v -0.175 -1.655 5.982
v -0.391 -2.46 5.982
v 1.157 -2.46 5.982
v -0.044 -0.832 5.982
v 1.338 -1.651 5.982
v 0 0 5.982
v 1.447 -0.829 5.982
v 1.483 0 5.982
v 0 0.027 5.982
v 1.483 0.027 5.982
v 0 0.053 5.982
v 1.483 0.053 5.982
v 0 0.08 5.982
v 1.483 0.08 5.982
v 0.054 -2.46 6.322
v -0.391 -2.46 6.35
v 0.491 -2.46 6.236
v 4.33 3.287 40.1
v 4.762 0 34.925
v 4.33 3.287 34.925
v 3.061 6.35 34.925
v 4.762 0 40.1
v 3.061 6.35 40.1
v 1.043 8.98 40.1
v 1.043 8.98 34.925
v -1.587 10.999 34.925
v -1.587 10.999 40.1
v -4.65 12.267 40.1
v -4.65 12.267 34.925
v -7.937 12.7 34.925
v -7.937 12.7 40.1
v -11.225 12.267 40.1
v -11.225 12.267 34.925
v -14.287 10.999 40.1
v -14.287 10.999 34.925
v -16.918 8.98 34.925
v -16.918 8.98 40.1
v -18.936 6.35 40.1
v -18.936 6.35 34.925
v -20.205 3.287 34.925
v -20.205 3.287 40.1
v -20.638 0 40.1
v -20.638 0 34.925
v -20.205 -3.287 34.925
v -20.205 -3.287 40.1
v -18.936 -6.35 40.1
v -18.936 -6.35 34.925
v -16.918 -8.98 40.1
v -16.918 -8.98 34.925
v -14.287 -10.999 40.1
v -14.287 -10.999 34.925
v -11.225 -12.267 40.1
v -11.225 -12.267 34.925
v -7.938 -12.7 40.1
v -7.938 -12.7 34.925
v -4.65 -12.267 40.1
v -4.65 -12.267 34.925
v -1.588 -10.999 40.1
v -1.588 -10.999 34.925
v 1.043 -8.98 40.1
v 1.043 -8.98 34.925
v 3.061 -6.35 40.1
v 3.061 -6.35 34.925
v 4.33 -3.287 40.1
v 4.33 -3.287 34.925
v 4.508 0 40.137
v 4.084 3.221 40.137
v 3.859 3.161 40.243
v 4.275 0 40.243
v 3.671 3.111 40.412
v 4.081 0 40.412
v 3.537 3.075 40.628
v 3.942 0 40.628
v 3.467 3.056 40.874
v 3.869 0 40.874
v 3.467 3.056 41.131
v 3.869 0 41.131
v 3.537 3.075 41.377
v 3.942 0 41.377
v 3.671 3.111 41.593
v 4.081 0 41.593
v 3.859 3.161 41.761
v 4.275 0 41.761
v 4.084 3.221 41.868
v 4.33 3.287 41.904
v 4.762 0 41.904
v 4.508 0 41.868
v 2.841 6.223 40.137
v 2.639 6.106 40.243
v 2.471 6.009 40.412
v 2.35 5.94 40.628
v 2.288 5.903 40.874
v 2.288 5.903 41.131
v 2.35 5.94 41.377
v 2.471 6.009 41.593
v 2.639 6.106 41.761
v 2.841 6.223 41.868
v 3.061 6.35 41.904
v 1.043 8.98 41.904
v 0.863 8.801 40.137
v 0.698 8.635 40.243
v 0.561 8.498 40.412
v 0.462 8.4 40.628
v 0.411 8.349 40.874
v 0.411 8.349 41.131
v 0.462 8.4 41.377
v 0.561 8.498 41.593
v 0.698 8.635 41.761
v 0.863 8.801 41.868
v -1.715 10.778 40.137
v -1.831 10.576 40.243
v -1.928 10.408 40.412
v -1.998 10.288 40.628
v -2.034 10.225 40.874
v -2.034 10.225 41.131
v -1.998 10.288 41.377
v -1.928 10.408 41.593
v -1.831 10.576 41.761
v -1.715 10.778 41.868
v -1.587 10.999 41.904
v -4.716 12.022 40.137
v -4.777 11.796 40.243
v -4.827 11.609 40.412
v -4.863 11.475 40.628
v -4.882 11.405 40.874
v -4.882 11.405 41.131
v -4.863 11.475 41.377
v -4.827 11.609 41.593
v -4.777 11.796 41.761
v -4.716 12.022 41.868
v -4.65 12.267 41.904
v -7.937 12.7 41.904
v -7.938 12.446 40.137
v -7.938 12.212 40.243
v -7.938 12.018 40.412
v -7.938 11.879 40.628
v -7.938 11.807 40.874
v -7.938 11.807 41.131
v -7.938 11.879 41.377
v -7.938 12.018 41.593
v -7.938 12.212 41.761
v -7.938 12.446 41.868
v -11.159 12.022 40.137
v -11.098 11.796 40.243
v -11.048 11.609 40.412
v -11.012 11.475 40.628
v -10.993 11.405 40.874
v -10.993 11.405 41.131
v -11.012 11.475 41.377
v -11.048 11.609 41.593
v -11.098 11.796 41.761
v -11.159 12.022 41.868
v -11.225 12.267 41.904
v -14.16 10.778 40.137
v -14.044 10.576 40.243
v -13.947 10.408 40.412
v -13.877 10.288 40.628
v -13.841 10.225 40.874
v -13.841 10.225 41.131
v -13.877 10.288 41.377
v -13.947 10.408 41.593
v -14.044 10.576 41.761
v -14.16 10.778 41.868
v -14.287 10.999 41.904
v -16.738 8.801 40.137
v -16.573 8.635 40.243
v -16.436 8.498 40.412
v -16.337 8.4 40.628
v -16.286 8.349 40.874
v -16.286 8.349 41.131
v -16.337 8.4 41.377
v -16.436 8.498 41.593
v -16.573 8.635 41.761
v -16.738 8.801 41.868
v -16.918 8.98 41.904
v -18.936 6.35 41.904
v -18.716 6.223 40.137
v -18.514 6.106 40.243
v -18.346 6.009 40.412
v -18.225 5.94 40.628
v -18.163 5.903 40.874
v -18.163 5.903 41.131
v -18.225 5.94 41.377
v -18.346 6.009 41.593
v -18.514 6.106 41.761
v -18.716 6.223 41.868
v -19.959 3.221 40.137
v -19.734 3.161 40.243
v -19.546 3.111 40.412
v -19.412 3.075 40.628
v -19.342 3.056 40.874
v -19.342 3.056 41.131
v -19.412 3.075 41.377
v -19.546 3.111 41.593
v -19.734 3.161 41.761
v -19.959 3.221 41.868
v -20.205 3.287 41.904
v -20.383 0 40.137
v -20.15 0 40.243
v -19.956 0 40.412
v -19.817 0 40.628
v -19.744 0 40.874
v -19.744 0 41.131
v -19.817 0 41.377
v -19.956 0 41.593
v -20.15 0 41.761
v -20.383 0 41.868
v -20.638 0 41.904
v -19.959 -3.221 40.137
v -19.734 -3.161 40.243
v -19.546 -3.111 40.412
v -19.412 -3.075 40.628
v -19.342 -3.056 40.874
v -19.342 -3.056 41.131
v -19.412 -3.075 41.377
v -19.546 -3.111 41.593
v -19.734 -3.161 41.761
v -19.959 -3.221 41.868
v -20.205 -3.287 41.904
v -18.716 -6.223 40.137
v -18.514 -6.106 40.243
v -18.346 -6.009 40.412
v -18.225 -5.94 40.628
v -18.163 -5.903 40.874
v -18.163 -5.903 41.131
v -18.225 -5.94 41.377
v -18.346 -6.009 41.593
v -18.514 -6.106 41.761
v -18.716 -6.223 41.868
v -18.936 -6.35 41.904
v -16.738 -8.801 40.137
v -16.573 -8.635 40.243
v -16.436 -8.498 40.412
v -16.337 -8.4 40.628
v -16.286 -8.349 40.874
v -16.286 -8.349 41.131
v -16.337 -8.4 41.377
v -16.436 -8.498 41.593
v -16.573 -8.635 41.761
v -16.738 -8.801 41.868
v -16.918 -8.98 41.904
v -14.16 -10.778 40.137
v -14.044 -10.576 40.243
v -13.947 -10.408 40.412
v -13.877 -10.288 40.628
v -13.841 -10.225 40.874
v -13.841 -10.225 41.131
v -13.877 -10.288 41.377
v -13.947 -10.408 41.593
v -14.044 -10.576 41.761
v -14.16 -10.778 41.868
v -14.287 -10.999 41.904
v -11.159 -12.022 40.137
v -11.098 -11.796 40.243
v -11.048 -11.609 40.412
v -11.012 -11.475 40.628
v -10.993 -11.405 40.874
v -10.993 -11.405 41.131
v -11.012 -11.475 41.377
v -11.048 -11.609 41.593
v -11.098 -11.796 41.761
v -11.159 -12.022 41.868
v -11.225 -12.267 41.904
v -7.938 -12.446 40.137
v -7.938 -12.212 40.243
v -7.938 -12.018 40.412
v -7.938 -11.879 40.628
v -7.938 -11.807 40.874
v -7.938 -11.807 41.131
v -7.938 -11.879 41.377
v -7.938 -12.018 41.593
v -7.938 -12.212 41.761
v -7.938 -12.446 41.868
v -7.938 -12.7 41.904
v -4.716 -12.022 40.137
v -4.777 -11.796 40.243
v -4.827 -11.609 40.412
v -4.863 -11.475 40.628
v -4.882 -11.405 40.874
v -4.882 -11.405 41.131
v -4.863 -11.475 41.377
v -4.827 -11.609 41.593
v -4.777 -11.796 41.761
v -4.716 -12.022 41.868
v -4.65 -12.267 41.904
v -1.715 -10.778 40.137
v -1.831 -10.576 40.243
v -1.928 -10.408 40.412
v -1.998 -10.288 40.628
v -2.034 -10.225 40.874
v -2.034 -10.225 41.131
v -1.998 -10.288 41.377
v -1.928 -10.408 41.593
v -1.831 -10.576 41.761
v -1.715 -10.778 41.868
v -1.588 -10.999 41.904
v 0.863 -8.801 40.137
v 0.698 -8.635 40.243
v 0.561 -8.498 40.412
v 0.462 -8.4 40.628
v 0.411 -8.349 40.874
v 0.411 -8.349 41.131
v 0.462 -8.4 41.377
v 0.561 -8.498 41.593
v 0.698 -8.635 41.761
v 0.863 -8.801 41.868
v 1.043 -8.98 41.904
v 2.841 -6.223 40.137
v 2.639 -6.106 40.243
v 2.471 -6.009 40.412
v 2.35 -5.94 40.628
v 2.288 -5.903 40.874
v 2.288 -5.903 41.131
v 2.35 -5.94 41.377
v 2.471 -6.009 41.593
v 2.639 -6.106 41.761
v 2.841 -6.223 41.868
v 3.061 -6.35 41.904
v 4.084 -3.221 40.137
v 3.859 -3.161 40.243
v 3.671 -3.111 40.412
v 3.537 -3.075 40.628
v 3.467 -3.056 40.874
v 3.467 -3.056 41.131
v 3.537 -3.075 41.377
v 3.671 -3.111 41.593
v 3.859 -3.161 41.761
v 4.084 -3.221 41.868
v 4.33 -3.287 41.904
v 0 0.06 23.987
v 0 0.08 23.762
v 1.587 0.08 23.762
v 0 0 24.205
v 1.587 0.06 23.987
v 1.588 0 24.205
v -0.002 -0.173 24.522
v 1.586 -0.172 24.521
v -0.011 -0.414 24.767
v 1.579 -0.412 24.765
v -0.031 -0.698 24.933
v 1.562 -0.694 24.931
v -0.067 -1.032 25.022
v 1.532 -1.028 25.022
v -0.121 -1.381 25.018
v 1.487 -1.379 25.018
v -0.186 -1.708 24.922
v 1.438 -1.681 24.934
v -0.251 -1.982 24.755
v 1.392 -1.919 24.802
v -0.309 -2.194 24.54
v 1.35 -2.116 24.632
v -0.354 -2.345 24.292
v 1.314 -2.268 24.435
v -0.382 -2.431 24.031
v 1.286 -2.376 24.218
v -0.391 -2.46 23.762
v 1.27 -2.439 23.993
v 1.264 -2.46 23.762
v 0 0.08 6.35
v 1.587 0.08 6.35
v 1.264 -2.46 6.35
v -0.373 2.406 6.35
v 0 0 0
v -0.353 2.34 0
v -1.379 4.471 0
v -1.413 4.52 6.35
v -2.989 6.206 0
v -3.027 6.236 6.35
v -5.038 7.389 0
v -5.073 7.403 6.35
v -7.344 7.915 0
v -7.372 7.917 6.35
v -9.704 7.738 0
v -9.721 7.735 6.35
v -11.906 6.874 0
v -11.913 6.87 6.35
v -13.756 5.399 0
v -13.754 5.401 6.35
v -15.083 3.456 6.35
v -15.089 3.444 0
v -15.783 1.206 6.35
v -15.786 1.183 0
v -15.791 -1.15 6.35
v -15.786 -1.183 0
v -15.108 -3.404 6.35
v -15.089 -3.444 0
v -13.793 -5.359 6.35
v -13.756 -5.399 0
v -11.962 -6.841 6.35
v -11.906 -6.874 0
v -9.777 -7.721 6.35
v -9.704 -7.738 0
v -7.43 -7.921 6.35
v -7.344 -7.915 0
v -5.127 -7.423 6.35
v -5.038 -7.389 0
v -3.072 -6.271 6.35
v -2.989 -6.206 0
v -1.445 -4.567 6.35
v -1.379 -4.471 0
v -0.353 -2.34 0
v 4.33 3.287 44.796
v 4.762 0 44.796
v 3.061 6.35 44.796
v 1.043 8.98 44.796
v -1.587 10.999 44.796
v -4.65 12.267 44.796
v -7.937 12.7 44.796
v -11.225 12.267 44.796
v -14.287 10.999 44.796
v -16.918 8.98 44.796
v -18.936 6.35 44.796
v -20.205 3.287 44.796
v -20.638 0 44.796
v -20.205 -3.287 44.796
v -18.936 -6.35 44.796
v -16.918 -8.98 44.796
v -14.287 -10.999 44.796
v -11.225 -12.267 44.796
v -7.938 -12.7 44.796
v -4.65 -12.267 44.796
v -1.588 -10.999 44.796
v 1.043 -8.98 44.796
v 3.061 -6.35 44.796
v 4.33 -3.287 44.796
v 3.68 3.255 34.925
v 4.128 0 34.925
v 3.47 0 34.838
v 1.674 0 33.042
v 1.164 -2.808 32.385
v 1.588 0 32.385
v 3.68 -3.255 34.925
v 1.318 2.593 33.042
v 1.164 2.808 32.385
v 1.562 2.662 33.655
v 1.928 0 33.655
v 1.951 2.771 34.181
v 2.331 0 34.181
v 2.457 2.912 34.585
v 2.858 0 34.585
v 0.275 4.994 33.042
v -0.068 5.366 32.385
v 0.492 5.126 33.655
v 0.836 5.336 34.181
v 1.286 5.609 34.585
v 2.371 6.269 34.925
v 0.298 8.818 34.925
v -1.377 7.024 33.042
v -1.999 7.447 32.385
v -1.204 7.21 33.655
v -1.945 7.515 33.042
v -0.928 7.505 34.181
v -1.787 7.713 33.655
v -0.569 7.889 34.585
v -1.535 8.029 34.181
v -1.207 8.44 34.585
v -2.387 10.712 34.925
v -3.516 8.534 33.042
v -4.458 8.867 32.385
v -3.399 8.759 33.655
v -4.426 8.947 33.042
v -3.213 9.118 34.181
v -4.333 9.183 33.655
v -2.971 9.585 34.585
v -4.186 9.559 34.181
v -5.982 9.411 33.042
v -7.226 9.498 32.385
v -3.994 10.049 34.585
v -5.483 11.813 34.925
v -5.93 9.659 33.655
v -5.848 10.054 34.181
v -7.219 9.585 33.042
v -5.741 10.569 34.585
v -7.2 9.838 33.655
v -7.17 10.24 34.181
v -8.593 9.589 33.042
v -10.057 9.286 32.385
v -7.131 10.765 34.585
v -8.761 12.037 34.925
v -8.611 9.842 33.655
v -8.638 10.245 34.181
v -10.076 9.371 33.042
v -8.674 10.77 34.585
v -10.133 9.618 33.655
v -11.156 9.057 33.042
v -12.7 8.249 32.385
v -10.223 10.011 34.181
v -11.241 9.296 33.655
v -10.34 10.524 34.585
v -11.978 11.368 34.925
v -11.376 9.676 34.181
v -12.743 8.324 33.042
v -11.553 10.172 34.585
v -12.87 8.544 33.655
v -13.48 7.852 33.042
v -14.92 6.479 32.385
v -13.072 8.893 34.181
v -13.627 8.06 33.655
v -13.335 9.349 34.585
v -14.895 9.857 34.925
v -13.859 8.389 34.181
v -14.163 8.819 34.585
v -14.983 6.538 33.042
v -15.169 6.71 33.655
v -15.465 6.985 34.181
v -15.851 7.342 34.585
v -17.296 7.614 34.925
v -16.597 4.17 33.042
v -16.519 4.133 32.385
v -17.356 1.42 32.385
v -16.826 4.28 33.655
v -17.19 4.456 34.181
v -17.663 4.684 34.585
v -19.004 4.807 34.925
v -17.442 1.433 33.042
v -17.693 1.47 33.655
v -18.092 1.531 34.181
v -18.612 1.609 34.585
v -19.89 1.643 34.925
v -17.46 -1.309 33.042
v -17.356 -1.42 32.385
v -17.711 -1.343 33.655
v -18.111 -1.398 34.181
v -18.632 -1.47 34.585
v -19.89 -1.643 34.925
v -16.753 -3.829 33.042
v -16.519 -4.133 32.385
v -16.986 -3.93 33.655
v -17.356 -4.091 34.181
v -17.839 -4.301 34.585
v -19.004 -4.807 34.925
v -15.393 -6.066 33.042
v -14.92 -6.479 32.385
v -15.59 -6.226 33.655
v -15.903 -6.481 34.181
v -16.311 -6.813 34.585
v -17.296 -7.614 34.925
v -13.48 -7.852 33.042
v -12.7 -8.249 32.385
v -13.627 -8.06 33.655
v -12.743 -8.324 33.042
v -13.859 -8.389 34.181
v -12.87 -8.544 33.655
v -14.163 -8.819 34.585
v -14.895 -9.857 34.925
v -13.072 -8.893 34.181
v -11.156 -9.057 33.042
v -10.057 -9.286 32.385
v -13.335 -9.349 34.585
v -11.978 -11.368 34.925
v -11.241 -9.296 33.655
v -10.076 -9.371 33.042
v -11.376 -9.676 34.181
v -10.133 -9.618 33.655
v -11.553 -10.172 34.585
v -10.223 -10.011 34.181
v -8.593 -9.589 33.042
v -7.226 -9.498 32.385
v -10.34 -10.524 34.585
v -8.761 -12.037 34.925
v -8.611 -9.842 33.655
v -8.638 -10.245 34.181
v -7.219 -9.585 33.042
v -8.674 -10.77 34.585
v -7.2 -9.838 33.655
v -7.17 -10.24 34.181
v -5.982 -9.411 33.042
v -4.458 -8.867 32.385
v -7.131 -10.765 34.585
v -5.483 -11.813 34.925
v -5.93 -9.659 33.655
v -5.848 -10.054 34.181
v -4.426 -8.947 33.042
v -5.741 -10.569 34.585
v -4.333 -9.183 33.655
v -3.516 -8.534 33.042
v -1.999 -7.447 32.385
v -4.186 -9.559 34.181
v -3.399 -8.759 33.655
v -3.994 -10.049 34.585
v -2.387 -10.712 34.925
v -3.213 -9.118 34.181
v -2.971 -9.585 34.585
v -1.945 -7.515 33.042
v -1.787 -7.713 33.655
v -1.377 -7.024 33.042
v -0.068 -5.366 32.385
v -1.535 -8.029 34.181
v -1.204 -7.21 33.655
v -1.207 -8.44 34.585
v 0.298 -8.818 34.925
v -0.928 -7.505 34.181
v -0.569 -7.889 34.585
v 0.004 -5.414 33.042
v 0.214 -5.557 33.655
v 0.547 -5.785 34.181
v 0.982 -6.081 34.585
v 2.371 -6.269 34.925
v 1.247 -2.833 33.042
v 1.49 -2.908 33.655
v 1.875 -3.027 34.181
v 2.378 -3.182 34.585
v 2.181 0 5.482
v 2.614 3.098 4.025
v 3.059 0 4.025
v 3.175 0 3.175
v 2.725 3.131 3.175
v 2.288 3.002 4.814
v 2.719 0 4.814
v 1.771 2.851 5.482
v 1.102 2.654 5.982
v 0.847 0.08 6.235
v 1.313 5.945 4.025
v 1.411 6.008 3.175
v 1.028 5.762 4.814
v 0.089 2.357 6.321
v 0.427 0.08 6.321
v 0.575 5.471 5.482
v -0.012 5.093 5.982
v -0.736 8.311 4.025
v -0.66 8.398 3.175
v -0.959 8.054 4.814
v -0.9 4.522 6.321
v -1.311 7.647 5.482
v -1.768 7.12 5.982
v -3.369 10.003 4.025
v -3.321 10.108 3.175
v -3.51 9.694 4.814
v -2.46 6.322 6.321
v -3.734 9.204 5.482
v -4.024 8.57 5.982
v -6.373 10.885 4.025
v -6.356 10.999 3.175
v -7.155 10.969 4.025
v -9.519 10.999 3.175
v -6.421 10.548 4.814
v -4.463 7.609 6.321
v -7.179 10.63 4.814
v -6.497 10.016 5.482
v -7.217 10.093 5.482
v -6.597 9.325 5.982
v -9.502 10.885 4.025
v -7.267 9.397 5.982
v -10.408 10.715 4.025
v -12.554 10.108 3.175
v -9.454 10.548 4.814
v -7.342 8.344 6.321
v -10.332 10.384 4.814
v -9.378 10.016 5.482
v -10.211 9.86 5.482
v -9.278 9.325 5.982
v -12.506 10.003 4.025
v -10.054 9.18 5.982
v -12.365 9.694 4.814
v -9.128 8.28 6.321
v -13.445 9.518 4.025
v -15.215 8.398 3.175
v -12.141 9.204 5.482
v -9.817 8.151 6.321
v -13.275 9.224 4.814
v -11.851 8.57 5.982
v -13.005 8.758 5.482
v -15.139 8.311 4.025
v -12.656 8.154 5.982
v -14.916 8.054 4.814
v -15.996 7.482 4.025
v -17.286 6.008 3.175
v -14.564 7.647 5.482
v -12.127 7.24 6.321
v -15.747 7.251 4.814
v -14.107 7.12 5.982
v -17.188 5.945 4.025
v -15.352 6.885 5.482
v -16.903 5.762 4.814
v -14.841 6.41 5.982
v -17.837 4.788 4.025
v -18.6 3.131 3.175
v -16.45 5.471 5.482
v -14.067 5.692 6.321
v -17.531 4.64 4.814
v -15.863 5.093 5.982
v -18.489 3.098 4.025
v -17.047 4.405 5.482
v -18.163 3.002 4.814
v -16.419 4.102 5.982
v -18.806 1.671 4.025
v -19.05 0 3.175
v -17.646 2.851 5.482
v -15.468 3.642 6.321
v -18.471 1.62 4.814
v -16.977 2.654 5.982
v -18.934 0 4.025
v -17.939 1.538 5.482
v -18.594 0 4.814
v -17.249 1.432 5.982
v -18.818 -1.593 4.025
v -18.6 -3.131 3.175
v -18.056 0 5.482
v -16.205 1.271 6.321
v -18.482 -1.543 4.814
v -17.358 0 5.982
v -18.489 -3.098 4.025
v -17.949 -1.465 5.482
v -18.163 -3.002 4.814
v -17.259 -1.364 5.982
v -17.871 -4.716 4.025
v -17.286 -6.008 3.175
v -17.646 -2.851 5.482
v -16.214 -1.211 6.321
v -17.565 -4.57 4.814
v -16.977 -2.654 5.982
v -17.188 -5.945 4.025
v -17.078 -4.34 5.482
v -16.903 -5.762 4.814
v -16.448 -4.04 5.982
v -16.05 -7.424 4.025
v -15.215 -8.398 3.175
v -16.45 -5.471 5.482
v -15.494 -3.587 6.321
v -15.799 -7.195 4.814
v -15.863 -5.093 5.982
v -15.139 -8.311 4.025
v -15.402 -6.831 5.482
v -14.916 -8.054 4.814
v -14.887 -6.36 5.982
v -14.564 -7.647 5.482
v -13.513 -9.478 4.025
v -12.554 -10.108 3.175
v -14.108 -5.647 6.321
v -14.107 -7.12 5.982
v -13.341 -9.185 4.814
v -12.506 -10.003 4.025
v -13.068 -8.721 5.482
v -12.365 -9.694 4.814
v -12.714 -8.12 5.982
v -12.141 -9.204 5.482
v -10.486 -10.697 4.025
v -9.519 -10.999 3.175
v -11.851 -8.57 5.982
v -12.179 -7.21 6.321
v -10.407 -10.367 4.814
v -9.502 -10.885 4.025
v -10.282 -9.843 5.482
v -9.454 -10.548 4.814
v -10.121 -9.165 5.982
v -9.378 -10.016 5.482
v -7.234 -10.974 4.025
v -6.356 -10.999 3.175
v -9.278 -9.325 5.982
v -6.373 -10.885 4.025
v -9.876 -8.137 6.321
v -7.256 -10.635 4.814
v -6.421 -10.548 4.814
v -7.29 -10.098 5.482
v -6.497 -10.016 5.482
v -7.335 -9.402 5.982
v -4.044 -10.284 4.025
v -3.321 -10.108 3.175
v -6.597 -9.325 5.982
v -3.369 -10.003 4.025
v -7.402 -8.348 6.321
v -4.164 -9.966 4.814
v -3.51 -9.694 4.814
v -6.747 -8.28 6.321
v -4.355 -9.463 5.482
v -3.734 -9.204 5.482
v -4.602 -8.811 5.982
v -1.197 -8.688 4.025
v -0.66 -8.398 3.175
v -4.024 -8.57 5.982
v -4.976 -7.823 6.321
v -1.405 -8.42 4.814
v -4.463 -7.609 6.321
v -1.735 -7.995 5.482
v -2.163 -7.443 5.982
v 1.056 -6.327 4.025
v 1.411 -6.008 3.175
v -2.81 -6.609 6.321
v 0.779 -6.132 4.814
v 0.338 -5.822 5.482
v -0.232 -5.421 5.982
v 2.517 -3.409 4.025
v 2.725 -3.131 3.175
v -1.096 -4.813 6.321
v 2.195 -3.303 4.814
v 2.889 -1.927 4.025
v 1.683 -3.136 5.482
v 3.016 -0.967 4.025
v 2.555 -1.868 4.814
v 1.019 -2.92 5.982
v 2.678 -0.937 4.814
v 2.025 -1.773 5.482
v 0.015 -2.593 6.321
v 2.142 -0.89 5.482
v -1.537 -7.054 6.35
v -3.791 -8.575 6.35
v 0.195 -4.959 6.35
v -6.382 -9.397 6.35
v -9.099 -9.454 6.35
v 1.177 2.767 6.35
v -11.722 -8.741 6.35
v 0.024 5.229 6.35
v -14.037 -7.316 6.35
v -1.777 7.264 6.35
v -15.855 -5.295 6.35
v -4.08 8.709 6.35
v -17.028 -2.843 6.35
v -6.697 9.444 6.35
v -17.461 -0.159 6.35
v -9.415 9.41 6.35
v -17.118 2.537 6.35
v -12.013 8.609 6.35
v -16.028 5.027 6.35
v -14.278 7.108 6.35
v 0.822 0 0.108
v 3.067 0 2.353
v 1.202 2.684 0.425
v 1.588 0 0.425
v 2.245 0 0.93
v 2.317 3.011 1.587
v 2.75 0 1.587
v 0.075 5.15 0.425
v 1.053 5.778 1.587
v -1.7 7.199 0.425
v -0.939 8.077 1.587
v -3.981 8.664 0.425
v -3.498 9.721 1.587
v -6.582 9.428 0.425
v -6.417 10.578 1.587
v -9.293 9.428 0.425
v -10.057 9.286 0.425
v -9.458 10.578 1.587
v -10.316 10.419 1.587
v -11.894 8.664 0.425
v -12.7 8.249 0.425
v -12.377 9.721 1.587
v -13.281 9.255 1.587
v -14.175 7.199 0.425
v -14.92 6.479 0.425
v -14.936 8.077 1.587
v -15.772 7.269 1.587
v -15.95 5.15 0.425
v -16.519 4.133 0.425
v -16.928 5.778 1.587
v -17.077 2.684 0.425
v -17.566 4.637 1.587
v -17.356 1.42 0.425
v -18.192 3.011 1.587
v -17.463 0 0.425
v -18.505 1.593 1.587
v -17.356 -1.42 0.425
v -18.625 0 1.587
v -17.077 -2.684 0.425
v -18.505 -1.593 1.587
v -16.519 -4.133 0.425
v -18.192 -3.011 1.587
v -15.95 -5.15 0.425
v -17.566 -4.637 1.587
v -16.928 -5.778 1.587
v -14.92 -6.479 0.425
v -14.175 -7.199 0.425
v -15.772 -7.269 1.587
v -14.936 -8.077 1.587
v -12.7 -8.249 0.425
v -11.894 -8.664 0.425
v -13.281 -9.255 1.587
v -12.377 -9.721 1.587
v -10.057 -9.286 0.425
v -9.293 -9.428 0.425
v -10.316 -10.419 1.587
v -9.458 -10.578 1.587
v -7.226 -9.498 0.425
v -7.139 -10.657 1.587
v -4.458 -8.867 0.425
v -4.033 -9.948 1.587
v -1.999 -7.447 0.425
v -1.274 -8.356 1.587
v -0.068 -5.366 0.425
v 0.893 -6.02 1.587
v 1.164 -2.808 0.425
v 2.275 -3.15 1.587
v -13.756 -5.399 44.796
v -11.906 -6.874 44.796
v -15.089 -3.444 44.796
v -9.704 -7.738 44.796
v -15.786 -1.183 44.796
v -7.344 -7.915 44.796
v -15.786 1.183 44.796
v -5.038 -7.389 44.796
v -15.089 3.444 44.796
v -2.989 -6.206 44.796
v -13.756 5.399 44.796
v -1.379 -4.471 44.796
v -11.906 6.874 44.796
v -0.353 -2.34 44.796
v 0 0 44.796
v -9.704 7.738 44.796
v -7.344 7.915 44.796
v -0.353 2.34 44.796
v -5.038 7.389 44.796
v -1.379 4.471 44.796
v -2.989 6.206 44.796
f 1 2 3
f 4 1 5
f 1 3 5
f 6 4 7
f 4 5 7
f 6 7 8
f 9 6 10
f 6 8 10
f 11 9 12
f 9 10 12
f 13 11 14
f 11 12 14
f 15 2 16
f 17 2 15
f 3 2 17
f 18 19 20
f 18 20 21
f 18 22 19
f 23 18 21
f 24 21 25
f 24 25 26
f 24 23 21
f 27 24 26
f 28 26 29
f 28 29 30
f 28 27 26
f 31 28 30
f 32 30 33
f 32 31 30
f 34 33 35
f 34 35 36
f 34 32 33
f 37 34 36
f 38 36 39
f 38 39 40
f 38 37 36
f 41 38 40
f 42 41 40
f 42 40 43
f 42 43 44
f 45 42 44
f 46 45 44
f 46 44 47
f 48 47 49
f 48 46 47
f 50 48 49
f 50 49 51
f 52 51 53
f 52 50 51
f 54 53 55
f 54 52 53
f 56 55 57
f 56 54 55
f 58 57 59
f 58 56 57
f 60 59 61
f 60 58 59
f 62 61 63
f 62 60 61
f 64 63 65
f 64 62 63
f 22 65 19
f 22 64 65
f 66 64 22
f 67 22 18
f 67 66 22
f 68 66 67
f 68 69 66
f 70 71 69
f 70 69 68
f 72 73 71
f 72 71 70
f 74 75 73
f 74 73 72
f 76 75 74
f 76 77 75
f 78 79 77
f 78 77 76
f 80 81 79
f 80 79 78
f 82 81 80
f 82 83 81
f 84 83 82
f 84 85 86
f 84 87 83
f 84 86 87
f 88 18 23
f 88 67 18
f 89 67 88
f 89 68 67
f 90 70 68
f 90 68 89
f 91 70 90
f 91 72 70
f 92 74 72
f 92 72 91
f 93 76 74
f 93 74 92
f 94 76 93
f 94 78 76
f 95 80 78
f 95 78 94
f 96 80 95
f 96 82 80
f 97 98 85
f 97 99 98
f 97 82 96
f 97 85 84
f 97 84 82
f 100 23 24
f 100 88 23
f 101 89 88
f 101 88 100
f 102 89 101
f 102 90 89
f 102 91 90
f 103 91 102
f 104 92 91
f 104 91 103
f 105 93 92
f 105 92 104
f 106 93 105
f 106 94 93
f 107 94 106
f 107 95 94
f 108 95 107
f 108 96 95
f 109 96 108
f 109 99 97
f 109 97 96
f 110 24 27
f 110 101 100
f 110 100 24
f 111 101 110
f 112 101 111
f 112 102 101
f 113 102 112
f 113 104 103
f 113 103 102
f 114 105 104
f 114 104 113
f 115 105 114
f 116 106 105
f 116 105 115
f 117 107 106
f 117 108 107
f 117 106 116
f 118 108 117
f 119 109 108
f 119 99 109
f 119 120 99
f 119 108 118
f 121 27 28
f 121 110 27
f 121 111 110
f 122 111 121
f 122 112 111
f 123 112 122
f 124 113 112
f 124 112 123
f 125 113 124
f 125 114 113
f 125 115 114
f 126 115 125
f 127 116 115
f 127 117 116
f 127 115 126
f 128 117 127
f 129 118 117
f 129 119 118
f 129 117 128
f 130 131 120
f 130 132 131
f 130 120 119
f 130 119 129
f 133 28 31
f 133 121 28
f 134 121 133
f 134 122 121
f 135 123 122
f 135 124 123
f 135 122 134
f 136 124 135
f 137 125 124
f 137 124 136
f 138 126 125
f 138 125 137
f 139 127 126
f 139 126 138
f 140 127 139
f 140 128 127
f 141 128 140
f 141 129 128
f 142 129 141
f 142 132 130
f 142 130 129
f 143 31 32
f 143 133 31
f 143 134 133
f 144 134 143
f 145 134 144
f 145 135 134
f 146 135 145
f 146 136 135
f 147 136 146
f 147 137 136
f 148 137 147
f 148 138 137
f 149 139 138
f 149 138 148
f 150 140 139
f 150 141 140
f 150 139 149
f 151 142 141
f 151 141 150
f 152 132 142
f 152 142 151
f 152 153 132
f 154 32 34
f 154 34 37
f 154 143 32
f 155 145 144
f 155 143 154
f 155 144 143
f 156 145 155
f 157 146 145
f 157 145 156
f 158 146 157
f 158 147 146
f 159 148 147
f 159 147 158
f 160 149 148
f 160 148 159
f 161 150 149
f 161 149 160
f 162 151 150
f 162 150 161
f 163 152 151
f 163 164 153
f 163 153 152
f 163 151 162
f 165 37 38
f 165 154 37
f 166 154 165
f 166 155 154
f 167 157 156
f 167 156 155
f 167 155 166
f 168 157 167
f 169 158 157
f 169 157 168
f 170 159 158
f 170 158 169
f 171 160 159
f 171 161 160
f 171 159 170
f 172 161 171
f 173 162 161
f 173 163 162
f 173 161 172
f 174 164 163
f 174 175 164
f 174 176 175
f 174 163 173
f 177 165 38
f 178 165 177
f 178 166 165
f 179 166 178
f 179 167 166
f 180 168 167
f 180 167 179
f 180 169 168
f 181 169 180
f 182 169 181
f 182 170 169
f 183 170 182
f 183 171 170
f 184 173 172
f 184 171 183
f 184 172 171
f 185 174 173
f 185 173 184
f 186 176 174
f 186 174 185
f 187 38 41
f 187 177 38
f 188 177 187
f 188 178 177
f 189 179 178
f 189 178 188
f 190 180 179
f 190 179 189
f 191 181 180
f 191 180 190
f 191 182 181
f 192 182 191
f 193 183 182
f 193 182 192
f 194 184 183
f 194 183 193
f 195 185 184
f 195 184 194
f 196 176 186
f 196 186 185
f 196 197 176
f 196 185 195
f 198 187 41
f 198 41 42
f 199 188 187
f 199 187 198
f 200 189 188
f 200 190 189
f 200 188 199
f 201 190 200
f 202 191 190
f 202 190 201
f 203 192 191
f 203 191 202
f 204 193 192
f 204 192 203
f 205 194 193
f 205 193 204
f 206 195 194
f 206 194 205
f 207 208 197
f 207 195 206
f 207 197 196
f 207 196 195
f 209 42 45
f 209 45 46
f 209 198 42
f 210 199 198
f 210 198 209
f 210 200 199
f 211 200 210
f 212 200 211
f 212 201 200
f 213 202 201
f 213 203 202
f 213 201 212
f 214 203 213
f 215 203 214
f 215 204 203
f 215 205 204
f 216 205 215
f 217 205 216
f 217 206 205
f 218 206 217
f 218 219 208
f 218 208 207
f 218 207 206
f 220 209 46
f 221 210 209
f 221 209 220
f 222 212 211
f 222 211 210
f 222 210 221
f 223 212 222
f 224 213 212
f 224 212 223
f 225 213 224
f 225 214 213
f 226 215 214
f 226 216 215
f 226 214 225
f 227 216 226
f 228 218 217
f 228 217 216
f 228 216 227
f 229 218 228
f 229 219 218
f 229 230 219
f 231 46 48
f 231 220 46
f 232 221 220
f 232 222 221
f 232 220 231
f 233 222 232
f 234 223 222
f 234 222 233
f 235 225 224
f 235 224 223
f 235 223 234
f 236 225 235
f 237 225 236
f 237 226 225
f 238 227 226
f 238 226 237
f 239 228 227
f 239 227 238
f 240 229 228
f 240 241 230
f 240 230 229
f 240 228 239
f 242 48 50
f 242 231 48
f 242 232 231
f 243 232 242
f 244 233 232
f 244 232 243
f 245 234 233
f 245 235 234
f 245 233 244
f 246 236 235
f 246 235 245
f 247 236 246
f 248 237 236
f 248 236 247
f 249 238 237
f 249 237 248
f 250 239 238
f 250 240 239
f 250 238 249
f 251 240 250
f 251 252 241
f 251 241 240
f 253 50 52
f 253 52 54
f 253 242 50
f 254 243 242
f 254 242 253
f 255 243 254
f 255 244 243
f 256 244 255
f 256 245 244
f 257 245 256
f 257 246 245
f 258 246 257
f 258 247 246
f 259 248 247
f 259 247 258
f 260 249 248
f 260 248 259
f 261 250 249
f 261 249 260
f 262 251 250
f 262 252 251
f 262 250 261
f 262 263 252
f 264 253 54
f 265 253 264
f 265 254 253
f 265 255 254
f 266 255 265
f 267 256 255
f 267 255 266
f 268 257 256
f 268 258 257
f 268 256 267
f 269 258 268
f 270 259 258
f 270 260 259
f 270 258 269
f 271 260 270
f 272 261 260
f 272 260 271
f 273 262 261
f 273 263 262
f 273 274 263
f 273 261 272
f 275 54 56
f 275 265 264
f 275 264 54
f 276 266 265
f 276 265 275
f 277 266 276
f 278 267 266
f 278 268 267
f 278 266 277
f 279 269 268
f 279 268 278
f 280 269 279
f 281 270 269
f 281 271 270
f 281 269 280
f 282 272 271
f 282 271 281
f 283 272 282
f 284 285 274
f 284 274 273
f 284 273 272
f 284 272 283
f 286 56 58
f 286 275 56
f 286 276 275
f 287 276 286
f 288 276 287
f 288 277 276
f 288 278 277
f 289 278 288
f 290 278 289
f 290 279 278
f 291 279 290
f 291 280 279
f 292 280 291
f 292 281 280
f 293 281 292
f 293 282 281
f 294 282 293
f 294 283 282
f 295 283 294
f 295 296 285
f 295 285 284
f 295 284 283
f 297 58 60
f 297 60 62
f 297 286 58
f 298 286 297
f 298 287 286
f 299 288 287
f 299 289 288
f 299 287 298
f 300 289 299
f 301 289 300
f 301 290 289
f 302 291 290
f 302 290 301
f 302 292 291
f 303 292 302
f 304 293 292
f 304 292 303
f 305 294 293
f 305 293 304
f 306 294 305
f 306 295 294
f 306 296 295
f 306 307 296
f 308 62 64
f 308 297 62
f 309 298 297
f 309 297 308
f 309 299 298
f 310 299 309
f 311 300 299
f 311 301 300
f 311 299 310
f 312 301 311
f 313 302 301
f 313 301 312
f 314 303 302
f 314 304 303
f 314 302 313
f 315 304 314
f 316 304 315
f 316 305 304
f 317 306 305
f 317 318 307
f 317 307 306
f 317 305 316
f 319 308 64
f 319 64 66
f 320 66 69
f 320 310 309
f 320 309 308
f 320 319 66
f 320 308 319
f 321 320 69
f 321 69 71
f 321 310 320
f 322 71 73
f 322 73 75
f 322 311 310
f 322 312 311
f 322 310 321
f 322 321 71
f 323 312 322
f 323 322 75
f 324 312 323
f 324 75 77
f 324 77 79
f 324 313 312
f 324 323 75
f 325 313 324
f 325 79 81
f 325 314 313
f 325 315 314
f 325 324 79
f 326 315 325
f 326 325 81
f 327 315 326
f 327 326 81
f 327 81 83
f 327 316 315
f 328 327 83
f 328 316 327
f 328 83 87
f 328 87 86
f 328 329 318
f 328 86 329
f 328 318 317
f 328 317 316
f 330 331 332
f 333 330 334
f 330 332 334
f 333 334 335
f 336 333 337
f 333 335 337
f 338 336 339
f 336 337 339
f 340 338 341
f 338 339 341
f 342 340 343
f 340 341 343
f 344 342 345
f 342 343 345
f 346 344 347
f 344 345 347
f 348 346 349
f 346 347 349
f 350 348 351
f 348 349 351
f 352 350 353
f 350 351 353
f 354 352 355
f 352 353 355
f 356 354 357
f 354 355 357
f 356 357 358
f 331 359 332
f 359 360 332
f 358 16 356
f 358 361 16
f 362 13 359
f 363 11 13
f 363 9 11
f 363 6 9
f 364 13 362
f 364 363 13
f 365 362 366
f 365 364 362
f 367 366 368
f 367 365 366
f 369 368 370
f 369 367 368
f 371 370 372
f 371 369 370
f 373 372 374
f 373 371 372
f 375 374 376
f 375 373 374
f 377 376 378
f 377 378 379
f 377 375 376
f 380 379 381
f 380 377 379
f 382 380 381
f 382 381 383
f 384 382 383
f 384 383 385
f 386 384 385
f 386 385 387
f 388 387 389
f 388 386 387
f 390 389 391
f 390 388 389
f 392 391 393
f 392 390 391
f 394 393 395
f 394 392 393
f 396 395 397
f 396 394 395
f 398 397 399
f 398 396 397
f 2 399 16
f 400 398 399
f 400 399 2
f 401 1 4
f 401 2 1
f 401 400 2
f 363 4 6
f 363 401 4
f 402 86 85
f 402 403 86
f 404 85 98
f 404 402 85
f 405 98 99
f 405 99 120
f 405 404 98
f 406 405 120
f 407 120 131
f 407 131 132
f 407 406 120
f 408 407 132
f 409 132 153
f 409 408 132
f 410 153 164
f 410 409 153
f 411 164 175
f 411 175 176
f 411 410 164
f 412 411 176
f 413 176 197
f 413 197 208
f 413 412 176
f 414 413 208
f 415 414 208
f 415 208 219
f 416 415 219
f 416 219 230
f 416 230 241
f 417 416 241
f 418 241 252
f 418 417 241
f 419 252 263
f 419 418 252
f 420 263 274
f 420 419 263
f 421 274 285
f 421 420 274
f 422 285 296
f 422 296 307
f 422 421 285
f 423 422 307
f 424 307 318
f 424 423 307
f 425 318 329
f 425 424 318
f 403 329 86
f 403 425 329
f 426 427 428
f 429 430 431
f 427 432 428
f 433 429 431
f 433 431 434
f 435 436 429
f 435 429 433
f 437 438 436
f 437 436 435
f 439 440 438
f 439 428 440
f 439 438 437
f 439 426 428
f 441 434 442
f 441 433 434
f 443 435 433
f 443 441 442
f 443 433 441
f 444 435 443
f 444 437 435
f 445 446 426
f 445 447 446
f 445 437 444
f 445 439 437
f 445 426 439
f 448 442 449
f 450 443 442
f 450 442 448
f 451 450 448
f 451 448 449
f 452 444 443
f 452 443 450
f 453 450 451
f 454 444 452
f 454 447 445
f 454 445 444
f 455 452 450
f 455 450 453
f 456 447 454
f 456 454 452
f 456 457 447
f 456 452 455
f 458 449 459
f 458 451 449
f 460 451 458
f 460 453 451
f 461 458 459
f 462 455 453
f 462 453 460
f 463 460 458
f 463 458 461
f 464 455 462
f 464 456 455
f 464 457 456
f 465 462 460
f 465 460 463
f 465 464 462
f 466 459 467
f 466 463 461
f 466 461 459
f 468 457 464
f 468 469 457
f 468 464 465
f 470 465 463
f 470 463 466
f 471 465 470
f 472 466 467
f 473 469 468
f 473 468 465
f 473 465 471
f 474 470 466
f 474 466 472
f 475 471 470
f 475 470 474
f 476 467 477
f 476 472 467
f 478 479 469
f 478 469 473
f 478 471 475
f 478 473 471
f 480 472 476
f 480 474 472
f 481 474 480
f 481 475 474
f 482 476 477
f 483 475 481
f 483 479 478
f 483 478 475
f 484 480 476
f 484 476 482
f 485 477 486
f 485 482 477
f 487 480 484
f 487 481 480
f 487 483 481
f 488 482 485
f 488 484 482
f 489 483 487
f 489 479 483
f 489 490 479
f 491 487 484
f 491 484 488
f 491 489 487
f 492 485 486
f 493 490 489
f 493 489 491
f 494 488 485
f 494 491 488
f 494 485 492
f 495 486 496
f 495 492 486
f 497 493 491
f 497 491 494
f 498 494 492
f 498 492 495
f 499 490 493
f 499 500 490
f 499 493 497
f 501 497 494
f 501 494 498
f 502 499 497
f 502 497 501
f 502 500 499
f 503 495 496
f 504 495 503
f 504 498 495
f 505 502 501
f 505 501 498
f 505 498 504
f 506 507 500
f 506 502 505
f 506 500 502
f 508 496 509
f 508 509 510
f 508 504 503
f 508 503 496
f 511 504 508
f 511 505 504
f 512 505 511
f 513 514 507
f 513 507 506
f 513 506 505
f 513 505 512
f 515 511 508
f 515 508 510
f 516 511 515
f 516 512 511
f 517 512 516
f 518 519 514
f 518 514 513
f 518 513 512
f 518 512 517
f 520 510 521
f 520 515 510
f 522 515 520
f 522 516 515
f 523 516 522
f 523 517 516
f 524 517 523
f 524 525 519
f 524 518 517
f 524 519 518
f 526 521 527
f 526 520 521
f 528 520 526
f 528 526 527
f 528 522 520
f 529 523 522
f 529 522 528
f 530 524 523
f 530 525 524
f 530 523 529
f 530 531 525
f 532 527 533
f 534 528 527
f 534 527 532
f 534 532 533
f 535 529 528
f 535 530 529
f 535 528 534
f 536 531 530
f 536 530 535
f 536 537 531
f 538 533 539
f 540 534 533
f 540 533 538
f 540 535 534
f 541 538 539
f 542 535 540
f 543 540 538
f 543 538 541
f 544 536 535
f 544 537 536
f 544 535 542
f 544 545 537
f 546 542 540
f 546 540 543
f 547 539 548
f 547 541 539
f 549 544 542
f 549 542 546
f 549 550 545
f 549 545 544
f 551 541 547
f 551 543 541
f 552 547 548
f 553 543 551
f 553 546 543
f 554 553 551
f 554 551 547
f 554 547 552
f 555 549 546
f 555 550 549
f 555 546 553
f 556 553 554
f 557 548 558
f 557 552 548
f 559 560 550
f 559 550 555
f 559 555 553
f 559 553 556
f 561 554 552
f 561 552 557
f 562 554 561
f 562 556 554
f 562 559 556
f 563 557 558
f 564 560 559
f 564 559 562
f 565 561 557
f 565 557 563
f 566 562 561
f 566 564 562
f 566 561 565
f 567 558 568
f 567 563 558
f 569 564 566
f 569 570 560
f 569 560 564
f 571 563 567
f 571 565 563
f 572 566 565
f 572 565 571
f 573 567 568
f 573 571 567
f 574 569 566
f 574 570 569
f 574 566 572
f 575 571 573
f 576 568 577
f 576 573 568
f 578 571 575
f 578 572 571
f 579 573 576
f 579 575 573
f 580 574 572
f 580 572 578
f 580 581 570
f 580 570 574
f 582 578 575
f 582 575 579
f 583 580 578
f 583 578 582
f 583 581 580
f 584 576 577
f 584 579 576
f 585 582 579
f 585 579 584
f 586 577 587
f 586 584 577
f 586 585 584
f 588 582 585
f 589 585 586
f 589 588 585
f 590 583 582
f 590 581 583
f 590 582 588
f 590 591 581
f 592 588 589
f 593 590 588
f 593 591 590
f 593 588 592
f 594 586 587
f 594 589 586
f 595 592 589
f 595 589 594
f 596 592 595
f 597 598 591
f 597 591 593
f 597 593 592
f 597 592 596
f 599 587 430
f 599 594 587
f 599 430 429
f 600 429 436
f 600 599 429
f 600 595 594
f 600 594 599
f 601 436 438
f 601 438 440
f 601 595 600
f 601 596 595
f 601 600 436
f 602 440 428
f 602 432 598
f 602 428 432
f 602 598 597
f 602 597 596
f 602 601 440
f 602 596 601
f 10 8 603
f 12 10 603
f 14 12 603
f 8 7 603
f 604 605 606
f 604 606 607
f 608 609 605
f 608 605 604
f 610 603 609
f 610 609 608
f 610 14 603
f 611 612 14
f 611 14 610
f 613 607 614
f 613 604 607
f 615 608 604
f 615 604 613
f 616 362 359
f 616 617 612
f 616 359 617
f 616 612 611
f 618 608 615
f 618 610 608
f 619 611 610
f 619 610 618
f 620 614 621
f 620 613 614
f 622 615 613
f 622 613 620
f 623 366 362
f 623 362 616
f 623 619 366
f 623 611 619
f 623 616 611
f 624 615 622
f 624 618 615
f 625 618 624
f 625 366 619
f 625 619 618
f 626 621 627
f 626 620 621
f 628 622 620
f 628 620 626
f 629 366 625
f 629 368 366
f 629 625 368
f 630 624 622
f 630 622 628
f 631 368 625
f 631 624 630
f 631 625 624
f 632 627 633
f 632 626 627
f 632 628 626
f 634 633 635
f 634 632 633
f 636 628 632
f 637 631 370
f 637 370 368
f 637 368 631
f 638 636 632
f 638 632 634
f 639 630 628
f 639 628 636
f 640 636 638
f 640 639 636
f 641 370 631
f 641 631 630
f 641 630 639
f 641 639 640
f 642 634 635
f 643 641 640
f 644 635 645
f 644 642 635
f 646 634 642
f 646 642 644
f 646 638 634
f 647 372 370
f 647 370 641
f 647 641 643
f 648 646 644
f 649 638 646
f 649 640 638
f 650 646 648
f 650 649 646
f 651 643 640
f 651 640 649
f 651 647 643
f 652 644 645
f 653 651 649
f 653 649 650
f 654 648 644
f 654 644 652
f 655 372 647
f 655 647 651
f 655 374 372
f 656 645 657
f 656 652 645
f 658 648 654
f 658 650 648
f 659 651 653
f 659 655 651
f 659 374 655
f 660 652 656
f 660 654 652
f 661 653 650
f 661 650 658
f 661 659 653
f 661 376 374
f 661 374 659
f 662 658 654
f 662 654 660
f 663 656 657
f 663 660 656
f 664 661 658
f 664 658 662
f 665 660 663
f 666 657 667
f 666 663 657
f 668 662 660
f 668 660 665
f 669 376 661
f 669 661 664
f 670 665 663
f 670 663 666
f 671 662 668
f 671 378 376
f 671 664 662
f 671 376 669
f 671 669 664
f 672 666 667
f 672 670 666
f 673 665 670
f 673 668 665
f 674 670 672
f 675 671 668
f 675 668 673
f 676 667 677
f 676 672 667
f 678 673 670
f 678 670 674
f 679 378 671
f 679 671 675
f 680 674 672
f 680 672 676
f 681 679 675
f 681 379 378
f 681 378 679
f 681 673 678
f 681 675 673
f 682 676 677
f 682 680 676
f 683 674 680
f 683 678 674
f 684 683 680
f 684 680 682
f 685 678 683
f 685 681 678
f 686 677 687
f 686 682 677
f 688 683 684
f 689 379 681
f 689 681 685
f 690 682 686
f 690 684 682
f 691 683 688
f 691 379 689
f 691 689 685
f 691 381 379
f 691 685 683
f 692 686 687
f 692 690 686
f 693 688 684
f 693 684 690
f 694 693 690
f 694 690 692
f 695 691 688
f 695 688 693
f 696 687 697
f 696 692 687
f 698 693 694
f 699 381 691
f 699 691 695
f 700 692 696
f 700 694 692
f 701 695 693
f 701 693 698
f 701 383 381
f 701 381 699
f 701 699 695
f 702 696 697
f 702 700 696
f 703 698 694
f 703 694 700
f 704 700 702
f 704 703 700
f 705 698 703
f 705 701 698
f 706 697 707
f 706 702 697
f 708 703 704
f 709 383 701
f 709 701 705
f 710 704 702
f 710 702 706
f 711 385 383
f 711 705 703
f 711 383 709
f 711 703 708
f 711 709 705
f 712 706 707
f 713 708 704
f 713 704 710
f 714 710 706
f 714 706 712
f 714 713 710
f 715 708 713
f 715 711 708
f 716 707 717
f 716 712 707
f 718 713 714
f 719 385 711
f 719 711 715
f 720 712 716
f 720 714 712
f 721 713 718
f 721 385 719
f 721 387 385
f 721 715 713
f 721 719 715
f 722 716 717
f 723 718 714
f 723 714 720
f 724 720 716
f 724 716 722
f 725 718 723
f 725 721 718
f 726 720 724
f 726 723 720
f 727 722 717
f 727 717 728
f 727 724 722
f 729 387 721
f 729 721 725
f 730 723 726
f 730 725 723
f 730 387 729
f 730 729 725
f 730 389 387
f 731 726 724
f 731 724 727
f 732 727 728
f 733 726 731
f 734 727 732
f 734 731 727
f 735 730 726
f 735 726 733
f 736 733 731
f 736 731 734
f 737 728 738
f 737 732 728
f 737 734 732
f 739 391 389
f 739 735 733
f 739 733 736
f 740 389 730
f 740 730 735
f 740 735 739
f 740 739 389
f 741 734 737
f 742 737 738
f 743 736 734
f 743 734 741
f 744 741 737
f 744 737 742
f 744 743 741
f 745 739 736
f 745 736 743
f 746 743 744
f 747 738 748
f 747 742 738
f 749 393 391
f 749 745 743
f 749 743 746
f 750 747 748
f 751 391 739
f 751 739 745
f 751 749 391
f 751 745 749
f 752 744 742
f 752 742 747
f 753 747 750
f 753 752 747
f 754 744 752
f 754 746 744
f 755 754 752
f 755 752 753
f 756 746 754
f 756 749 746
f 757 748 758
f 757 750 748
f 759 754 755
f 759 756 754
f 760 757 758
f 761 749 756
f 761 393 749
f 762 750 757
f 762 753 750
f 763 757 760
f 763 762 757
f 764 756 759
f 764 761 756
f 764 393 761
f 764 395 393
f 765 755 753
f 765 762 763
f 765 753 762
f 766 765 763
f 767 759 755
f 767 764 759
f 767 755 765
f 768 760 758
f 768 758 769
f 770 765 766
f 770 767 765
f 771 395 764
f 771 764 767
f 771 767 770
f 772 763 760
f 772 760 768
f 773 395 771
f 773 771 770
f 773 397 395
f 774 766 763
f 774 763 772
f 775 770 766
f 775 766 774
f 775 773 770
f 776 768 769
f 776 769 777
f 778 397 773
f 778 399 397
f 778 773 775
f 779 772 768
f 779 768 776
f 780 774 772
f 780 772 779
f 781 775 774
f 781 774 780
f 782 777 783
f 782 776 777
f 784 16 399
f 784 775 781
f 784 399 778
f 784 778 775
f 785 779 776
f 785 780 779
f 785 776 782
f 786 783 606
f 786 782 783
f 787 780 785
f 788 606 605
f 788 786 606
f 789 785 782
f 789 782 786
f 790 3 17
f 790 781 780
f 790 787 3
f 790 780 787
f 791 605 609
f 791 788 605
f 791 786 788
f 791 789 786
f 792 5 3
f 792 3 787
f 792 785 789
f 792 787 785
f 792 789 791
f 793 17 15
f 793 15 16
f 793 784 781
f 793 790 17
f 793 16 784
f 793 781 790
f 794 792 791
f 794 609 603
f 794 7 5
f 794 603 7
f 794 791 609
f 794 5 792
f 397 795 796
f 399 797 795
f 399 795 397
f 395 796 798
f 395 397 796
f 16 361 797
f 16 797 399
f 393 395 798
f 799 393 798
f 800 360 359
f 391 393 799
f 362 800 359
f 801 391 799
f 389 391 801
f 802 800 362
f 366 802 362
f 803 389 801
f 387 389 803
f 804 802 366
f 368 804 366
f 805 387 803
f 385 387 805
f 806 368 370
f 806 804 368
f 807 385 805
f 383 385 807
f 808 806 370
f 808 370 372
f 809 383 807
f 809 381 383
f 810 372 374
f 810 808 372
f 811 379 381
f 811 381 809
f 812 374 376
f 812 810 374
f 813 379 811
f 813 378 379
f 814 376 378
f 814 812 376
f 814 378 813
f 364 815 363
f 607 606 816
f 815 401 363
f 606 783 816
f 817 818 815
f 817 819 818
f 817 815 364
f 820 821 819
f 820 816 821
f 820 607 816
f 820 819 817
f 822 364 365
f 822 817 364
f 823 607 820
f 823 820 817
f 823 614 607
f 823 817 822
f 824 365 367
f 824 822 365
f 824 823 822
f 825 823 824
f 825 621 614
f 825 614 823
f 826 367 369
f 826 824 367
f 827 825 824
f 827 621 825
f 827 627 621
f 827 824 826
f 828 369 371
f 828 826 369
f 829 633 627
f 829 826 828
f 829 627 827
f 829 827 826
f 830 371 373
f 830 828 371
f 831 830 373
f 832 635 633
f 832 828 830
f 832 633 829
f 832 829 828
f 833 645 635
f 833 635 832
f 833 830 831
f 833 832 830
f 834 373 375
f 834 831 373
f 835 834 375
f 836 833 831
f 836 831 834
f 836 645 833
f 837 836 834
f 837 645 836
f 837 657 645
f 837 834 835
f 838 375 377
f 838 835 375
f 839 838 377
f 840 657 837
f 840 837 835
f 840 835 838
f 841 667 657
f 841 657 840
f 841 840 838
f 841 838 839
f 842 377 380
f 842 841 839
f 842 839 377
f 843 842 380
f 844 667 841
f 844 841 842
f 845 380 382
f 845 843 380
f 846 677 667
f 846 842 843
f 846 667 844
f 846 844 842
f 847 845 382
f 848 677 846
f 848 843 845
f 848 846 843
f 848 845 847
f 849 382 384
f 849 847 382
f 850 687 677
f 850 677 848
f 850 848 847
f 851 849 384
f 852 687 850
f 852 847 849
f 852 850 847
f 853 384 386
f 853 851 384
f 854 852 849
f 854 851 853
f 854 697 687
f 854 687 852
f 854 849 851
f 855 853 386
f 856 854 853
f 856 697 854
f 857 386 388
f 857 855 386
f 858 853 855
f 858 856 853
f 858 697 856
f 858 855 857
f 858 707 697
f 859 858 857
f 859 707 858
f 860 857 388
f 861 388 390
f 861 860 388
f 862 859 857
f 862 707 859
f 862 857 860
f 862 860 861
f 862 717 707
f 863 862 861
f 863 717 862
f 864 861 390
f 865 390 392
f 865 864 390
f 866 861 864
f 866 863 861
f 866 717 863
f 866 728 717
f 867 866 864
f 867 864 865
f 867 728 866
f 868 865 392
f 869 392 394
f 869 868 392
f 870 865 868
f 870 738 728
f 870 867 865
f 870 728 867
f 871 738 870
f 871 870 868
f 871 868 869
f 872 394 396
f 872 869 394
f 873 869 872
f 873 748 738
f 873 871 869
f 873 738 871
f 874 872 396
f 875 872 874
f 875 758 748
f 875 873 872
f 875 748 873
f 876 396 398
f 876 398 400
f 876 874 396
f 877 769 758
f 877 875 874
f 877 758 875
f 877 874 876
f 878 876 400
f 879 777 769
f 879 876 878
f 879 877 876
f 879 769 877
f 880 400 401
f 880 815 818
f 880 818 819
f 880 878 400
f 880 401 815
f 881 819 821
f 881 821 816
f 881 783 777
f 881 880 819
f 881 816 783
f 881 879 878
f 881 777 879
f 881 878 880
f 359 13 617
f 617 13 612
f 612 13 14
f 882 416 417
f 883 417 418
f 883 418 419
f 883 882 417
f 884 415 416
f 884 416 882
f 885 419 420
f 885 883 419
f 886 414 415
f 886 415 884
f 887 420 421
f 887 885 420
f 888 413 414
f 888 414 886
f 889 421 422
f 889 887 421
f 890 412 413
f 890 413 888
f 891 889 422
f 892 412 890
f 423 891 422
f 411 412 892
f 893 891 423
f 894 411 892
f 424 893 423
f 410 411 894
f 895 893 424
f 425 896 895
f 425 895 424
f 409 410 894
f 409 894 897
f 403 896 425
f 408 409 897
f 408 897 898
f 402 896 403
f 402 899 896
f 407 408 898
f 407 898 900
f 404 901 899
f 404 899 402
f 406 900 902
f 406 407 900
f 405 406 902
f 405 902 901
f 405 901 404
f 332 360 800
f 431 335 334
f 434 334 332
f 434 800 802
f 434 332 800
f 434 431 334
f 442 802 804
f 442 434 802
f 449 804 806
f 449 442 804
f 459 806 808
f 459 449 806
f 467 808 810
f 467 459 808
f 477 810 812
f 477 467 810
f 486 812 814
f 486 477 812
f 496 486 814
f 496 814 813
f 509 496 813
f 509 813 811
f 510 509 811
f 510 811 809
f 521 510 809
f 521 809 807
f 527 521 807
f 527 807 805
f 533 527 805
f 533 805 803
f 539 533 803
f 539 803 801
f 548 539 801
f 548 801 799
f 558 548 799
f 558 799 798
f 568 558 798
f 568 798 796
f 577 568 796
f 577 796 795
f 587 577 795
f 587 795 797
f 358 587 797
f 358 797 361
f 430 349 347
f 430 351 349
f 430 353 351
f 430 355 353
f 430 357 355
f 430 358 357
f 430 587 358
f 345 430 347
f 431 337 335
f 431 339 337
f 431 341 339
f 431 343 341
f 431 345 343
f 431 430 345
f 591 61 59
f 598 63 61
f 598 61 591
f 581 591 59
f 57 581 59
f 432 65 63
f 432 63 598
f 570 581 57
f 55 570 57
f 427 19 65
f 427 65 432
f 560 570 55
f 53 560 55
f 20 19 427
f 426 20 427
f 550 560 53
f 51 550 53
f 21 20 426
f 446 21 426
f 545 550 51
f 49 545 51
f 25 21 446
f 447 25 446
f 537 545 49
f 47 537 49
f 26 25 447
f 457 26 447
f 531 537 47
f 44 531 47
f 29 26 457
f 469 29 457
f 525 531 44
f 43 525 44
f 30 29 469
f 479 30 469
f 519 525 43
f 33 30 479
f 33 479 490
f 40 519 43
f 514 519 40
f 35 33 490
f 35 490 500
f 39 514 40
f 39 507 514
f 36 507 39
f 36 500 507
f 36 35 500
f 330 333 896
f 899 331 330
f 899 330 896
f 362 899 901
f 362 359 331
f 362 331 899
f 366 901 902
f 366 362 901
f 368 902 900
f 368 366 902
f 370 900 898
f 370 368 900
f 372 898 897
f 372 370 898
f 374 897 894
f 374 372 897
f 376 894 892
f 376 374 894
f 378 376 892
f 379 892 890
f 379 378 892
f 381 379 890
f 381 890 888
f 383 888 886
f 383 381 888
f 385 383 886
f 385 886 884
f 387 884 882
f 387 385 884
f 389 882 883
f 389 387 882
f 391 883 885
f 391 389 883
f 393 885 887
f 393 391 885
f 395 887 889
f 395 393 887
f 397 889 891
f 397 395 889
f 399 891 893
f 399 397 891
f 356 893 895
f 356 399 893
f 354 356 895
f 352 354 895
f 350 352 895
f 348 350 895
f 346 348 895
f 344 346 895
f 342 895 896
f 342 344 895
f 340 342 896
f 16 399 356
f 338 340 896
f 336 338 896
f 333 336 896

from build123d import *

# Parameters (mm, degrees)
F0_W     = 1.5875
F0_H     = 28.575
F2_R     = 2.54
F3_W     = 2.54
F3_H     = 17.78
F4_DEPTH = 12.7


with BuildPart() as f1:
    # F0 (on Front) → F1 (revolve)
    with BuildSketch(Plane.XZ):
        with Locations((0.79375, 20.6375)):
            Rectangle(F0_W, F0_H)
        with BuildLine():
            Line((0, 44.7964034975), (0, 34.925))
            Line((0, 34.925), (1.5875, 34.925))
            Line((1.5875, 34.925), (4.7625, 34.925))
            Line((4.7625, 34.925), (4.7625, 40.1001311839))
            ThreePointArc((4.7625, 40.1001311839), (3.8603166461, 41.0023145378), (4.7625, 41.9044978917))
            Line((4.7625, 41.9044978917), (4.7625, 44.7964034975))
            Line((4.7625, 44.7964034975), (0, 44.7964034975))
        make_face()
    revolve(axis=Axis((-7.9375, 0, 26.2395332485), (0, 0, 1)))

    # F2
    f2_edges = [f1.edges().sort_by_distance(p)[0] for p in [
        (-17.4625, 0, 34.925),
    ]]
    fillet(f2_edges, radius=F2_R)


with BuildPart() as f1b:
    # F0 (on Front) → F1, piece 2 (revolve)
    with BuildSketch(Plane.XZ):
        with BuildLine():
            Line((0, 6.35), (0, 0))
            ThreePointArc((0, 0), (2.2450640303, 0.9299359697), (3.175, 3.175))
            ThreePointArc((3.175, 3.175), (2.2450640303, 5.4200640303), (0, 6.35))
        make_face()
    revolve(axis=Axis((-7.9375, 0, 26.2395332485), (0, 0, 1)))


with BuildPart() as f4_tool:
    # F3 (on Right) → F4 (new body, symmetric)
    with BuildSketch(Plane.YZ):
        with Locations((-1.1903626225, 14.8721342405)):
            Rectangle(F3_W, F3_H)
        with BuildLine():
            ThreePointArc((0.0796373775, 23.7621342405), (-1.1903626225, 25.0321342405), (-2.4603626225, 23.7621342405))
            Line((-2.4603626225, 23.7621342405), (0.0796373775, 23.7621342405))
        make_face()
    extrude(amount=F4_DEPTH, both=True)


with BuildPart() as f1_1:
    add(f1.part)

    # F4: cut by f4_tool
    add(f4_tool.part, mode=Mode.SUBTRACT)


with BuildPart() as f1b_1:
    add(f1b.part)

    # F4: cut by f4_tool
    add(f4_tool.part, mode=Mode.SUBTRACT)


solid = Compound([f1_1.part, f1b_1.part])
